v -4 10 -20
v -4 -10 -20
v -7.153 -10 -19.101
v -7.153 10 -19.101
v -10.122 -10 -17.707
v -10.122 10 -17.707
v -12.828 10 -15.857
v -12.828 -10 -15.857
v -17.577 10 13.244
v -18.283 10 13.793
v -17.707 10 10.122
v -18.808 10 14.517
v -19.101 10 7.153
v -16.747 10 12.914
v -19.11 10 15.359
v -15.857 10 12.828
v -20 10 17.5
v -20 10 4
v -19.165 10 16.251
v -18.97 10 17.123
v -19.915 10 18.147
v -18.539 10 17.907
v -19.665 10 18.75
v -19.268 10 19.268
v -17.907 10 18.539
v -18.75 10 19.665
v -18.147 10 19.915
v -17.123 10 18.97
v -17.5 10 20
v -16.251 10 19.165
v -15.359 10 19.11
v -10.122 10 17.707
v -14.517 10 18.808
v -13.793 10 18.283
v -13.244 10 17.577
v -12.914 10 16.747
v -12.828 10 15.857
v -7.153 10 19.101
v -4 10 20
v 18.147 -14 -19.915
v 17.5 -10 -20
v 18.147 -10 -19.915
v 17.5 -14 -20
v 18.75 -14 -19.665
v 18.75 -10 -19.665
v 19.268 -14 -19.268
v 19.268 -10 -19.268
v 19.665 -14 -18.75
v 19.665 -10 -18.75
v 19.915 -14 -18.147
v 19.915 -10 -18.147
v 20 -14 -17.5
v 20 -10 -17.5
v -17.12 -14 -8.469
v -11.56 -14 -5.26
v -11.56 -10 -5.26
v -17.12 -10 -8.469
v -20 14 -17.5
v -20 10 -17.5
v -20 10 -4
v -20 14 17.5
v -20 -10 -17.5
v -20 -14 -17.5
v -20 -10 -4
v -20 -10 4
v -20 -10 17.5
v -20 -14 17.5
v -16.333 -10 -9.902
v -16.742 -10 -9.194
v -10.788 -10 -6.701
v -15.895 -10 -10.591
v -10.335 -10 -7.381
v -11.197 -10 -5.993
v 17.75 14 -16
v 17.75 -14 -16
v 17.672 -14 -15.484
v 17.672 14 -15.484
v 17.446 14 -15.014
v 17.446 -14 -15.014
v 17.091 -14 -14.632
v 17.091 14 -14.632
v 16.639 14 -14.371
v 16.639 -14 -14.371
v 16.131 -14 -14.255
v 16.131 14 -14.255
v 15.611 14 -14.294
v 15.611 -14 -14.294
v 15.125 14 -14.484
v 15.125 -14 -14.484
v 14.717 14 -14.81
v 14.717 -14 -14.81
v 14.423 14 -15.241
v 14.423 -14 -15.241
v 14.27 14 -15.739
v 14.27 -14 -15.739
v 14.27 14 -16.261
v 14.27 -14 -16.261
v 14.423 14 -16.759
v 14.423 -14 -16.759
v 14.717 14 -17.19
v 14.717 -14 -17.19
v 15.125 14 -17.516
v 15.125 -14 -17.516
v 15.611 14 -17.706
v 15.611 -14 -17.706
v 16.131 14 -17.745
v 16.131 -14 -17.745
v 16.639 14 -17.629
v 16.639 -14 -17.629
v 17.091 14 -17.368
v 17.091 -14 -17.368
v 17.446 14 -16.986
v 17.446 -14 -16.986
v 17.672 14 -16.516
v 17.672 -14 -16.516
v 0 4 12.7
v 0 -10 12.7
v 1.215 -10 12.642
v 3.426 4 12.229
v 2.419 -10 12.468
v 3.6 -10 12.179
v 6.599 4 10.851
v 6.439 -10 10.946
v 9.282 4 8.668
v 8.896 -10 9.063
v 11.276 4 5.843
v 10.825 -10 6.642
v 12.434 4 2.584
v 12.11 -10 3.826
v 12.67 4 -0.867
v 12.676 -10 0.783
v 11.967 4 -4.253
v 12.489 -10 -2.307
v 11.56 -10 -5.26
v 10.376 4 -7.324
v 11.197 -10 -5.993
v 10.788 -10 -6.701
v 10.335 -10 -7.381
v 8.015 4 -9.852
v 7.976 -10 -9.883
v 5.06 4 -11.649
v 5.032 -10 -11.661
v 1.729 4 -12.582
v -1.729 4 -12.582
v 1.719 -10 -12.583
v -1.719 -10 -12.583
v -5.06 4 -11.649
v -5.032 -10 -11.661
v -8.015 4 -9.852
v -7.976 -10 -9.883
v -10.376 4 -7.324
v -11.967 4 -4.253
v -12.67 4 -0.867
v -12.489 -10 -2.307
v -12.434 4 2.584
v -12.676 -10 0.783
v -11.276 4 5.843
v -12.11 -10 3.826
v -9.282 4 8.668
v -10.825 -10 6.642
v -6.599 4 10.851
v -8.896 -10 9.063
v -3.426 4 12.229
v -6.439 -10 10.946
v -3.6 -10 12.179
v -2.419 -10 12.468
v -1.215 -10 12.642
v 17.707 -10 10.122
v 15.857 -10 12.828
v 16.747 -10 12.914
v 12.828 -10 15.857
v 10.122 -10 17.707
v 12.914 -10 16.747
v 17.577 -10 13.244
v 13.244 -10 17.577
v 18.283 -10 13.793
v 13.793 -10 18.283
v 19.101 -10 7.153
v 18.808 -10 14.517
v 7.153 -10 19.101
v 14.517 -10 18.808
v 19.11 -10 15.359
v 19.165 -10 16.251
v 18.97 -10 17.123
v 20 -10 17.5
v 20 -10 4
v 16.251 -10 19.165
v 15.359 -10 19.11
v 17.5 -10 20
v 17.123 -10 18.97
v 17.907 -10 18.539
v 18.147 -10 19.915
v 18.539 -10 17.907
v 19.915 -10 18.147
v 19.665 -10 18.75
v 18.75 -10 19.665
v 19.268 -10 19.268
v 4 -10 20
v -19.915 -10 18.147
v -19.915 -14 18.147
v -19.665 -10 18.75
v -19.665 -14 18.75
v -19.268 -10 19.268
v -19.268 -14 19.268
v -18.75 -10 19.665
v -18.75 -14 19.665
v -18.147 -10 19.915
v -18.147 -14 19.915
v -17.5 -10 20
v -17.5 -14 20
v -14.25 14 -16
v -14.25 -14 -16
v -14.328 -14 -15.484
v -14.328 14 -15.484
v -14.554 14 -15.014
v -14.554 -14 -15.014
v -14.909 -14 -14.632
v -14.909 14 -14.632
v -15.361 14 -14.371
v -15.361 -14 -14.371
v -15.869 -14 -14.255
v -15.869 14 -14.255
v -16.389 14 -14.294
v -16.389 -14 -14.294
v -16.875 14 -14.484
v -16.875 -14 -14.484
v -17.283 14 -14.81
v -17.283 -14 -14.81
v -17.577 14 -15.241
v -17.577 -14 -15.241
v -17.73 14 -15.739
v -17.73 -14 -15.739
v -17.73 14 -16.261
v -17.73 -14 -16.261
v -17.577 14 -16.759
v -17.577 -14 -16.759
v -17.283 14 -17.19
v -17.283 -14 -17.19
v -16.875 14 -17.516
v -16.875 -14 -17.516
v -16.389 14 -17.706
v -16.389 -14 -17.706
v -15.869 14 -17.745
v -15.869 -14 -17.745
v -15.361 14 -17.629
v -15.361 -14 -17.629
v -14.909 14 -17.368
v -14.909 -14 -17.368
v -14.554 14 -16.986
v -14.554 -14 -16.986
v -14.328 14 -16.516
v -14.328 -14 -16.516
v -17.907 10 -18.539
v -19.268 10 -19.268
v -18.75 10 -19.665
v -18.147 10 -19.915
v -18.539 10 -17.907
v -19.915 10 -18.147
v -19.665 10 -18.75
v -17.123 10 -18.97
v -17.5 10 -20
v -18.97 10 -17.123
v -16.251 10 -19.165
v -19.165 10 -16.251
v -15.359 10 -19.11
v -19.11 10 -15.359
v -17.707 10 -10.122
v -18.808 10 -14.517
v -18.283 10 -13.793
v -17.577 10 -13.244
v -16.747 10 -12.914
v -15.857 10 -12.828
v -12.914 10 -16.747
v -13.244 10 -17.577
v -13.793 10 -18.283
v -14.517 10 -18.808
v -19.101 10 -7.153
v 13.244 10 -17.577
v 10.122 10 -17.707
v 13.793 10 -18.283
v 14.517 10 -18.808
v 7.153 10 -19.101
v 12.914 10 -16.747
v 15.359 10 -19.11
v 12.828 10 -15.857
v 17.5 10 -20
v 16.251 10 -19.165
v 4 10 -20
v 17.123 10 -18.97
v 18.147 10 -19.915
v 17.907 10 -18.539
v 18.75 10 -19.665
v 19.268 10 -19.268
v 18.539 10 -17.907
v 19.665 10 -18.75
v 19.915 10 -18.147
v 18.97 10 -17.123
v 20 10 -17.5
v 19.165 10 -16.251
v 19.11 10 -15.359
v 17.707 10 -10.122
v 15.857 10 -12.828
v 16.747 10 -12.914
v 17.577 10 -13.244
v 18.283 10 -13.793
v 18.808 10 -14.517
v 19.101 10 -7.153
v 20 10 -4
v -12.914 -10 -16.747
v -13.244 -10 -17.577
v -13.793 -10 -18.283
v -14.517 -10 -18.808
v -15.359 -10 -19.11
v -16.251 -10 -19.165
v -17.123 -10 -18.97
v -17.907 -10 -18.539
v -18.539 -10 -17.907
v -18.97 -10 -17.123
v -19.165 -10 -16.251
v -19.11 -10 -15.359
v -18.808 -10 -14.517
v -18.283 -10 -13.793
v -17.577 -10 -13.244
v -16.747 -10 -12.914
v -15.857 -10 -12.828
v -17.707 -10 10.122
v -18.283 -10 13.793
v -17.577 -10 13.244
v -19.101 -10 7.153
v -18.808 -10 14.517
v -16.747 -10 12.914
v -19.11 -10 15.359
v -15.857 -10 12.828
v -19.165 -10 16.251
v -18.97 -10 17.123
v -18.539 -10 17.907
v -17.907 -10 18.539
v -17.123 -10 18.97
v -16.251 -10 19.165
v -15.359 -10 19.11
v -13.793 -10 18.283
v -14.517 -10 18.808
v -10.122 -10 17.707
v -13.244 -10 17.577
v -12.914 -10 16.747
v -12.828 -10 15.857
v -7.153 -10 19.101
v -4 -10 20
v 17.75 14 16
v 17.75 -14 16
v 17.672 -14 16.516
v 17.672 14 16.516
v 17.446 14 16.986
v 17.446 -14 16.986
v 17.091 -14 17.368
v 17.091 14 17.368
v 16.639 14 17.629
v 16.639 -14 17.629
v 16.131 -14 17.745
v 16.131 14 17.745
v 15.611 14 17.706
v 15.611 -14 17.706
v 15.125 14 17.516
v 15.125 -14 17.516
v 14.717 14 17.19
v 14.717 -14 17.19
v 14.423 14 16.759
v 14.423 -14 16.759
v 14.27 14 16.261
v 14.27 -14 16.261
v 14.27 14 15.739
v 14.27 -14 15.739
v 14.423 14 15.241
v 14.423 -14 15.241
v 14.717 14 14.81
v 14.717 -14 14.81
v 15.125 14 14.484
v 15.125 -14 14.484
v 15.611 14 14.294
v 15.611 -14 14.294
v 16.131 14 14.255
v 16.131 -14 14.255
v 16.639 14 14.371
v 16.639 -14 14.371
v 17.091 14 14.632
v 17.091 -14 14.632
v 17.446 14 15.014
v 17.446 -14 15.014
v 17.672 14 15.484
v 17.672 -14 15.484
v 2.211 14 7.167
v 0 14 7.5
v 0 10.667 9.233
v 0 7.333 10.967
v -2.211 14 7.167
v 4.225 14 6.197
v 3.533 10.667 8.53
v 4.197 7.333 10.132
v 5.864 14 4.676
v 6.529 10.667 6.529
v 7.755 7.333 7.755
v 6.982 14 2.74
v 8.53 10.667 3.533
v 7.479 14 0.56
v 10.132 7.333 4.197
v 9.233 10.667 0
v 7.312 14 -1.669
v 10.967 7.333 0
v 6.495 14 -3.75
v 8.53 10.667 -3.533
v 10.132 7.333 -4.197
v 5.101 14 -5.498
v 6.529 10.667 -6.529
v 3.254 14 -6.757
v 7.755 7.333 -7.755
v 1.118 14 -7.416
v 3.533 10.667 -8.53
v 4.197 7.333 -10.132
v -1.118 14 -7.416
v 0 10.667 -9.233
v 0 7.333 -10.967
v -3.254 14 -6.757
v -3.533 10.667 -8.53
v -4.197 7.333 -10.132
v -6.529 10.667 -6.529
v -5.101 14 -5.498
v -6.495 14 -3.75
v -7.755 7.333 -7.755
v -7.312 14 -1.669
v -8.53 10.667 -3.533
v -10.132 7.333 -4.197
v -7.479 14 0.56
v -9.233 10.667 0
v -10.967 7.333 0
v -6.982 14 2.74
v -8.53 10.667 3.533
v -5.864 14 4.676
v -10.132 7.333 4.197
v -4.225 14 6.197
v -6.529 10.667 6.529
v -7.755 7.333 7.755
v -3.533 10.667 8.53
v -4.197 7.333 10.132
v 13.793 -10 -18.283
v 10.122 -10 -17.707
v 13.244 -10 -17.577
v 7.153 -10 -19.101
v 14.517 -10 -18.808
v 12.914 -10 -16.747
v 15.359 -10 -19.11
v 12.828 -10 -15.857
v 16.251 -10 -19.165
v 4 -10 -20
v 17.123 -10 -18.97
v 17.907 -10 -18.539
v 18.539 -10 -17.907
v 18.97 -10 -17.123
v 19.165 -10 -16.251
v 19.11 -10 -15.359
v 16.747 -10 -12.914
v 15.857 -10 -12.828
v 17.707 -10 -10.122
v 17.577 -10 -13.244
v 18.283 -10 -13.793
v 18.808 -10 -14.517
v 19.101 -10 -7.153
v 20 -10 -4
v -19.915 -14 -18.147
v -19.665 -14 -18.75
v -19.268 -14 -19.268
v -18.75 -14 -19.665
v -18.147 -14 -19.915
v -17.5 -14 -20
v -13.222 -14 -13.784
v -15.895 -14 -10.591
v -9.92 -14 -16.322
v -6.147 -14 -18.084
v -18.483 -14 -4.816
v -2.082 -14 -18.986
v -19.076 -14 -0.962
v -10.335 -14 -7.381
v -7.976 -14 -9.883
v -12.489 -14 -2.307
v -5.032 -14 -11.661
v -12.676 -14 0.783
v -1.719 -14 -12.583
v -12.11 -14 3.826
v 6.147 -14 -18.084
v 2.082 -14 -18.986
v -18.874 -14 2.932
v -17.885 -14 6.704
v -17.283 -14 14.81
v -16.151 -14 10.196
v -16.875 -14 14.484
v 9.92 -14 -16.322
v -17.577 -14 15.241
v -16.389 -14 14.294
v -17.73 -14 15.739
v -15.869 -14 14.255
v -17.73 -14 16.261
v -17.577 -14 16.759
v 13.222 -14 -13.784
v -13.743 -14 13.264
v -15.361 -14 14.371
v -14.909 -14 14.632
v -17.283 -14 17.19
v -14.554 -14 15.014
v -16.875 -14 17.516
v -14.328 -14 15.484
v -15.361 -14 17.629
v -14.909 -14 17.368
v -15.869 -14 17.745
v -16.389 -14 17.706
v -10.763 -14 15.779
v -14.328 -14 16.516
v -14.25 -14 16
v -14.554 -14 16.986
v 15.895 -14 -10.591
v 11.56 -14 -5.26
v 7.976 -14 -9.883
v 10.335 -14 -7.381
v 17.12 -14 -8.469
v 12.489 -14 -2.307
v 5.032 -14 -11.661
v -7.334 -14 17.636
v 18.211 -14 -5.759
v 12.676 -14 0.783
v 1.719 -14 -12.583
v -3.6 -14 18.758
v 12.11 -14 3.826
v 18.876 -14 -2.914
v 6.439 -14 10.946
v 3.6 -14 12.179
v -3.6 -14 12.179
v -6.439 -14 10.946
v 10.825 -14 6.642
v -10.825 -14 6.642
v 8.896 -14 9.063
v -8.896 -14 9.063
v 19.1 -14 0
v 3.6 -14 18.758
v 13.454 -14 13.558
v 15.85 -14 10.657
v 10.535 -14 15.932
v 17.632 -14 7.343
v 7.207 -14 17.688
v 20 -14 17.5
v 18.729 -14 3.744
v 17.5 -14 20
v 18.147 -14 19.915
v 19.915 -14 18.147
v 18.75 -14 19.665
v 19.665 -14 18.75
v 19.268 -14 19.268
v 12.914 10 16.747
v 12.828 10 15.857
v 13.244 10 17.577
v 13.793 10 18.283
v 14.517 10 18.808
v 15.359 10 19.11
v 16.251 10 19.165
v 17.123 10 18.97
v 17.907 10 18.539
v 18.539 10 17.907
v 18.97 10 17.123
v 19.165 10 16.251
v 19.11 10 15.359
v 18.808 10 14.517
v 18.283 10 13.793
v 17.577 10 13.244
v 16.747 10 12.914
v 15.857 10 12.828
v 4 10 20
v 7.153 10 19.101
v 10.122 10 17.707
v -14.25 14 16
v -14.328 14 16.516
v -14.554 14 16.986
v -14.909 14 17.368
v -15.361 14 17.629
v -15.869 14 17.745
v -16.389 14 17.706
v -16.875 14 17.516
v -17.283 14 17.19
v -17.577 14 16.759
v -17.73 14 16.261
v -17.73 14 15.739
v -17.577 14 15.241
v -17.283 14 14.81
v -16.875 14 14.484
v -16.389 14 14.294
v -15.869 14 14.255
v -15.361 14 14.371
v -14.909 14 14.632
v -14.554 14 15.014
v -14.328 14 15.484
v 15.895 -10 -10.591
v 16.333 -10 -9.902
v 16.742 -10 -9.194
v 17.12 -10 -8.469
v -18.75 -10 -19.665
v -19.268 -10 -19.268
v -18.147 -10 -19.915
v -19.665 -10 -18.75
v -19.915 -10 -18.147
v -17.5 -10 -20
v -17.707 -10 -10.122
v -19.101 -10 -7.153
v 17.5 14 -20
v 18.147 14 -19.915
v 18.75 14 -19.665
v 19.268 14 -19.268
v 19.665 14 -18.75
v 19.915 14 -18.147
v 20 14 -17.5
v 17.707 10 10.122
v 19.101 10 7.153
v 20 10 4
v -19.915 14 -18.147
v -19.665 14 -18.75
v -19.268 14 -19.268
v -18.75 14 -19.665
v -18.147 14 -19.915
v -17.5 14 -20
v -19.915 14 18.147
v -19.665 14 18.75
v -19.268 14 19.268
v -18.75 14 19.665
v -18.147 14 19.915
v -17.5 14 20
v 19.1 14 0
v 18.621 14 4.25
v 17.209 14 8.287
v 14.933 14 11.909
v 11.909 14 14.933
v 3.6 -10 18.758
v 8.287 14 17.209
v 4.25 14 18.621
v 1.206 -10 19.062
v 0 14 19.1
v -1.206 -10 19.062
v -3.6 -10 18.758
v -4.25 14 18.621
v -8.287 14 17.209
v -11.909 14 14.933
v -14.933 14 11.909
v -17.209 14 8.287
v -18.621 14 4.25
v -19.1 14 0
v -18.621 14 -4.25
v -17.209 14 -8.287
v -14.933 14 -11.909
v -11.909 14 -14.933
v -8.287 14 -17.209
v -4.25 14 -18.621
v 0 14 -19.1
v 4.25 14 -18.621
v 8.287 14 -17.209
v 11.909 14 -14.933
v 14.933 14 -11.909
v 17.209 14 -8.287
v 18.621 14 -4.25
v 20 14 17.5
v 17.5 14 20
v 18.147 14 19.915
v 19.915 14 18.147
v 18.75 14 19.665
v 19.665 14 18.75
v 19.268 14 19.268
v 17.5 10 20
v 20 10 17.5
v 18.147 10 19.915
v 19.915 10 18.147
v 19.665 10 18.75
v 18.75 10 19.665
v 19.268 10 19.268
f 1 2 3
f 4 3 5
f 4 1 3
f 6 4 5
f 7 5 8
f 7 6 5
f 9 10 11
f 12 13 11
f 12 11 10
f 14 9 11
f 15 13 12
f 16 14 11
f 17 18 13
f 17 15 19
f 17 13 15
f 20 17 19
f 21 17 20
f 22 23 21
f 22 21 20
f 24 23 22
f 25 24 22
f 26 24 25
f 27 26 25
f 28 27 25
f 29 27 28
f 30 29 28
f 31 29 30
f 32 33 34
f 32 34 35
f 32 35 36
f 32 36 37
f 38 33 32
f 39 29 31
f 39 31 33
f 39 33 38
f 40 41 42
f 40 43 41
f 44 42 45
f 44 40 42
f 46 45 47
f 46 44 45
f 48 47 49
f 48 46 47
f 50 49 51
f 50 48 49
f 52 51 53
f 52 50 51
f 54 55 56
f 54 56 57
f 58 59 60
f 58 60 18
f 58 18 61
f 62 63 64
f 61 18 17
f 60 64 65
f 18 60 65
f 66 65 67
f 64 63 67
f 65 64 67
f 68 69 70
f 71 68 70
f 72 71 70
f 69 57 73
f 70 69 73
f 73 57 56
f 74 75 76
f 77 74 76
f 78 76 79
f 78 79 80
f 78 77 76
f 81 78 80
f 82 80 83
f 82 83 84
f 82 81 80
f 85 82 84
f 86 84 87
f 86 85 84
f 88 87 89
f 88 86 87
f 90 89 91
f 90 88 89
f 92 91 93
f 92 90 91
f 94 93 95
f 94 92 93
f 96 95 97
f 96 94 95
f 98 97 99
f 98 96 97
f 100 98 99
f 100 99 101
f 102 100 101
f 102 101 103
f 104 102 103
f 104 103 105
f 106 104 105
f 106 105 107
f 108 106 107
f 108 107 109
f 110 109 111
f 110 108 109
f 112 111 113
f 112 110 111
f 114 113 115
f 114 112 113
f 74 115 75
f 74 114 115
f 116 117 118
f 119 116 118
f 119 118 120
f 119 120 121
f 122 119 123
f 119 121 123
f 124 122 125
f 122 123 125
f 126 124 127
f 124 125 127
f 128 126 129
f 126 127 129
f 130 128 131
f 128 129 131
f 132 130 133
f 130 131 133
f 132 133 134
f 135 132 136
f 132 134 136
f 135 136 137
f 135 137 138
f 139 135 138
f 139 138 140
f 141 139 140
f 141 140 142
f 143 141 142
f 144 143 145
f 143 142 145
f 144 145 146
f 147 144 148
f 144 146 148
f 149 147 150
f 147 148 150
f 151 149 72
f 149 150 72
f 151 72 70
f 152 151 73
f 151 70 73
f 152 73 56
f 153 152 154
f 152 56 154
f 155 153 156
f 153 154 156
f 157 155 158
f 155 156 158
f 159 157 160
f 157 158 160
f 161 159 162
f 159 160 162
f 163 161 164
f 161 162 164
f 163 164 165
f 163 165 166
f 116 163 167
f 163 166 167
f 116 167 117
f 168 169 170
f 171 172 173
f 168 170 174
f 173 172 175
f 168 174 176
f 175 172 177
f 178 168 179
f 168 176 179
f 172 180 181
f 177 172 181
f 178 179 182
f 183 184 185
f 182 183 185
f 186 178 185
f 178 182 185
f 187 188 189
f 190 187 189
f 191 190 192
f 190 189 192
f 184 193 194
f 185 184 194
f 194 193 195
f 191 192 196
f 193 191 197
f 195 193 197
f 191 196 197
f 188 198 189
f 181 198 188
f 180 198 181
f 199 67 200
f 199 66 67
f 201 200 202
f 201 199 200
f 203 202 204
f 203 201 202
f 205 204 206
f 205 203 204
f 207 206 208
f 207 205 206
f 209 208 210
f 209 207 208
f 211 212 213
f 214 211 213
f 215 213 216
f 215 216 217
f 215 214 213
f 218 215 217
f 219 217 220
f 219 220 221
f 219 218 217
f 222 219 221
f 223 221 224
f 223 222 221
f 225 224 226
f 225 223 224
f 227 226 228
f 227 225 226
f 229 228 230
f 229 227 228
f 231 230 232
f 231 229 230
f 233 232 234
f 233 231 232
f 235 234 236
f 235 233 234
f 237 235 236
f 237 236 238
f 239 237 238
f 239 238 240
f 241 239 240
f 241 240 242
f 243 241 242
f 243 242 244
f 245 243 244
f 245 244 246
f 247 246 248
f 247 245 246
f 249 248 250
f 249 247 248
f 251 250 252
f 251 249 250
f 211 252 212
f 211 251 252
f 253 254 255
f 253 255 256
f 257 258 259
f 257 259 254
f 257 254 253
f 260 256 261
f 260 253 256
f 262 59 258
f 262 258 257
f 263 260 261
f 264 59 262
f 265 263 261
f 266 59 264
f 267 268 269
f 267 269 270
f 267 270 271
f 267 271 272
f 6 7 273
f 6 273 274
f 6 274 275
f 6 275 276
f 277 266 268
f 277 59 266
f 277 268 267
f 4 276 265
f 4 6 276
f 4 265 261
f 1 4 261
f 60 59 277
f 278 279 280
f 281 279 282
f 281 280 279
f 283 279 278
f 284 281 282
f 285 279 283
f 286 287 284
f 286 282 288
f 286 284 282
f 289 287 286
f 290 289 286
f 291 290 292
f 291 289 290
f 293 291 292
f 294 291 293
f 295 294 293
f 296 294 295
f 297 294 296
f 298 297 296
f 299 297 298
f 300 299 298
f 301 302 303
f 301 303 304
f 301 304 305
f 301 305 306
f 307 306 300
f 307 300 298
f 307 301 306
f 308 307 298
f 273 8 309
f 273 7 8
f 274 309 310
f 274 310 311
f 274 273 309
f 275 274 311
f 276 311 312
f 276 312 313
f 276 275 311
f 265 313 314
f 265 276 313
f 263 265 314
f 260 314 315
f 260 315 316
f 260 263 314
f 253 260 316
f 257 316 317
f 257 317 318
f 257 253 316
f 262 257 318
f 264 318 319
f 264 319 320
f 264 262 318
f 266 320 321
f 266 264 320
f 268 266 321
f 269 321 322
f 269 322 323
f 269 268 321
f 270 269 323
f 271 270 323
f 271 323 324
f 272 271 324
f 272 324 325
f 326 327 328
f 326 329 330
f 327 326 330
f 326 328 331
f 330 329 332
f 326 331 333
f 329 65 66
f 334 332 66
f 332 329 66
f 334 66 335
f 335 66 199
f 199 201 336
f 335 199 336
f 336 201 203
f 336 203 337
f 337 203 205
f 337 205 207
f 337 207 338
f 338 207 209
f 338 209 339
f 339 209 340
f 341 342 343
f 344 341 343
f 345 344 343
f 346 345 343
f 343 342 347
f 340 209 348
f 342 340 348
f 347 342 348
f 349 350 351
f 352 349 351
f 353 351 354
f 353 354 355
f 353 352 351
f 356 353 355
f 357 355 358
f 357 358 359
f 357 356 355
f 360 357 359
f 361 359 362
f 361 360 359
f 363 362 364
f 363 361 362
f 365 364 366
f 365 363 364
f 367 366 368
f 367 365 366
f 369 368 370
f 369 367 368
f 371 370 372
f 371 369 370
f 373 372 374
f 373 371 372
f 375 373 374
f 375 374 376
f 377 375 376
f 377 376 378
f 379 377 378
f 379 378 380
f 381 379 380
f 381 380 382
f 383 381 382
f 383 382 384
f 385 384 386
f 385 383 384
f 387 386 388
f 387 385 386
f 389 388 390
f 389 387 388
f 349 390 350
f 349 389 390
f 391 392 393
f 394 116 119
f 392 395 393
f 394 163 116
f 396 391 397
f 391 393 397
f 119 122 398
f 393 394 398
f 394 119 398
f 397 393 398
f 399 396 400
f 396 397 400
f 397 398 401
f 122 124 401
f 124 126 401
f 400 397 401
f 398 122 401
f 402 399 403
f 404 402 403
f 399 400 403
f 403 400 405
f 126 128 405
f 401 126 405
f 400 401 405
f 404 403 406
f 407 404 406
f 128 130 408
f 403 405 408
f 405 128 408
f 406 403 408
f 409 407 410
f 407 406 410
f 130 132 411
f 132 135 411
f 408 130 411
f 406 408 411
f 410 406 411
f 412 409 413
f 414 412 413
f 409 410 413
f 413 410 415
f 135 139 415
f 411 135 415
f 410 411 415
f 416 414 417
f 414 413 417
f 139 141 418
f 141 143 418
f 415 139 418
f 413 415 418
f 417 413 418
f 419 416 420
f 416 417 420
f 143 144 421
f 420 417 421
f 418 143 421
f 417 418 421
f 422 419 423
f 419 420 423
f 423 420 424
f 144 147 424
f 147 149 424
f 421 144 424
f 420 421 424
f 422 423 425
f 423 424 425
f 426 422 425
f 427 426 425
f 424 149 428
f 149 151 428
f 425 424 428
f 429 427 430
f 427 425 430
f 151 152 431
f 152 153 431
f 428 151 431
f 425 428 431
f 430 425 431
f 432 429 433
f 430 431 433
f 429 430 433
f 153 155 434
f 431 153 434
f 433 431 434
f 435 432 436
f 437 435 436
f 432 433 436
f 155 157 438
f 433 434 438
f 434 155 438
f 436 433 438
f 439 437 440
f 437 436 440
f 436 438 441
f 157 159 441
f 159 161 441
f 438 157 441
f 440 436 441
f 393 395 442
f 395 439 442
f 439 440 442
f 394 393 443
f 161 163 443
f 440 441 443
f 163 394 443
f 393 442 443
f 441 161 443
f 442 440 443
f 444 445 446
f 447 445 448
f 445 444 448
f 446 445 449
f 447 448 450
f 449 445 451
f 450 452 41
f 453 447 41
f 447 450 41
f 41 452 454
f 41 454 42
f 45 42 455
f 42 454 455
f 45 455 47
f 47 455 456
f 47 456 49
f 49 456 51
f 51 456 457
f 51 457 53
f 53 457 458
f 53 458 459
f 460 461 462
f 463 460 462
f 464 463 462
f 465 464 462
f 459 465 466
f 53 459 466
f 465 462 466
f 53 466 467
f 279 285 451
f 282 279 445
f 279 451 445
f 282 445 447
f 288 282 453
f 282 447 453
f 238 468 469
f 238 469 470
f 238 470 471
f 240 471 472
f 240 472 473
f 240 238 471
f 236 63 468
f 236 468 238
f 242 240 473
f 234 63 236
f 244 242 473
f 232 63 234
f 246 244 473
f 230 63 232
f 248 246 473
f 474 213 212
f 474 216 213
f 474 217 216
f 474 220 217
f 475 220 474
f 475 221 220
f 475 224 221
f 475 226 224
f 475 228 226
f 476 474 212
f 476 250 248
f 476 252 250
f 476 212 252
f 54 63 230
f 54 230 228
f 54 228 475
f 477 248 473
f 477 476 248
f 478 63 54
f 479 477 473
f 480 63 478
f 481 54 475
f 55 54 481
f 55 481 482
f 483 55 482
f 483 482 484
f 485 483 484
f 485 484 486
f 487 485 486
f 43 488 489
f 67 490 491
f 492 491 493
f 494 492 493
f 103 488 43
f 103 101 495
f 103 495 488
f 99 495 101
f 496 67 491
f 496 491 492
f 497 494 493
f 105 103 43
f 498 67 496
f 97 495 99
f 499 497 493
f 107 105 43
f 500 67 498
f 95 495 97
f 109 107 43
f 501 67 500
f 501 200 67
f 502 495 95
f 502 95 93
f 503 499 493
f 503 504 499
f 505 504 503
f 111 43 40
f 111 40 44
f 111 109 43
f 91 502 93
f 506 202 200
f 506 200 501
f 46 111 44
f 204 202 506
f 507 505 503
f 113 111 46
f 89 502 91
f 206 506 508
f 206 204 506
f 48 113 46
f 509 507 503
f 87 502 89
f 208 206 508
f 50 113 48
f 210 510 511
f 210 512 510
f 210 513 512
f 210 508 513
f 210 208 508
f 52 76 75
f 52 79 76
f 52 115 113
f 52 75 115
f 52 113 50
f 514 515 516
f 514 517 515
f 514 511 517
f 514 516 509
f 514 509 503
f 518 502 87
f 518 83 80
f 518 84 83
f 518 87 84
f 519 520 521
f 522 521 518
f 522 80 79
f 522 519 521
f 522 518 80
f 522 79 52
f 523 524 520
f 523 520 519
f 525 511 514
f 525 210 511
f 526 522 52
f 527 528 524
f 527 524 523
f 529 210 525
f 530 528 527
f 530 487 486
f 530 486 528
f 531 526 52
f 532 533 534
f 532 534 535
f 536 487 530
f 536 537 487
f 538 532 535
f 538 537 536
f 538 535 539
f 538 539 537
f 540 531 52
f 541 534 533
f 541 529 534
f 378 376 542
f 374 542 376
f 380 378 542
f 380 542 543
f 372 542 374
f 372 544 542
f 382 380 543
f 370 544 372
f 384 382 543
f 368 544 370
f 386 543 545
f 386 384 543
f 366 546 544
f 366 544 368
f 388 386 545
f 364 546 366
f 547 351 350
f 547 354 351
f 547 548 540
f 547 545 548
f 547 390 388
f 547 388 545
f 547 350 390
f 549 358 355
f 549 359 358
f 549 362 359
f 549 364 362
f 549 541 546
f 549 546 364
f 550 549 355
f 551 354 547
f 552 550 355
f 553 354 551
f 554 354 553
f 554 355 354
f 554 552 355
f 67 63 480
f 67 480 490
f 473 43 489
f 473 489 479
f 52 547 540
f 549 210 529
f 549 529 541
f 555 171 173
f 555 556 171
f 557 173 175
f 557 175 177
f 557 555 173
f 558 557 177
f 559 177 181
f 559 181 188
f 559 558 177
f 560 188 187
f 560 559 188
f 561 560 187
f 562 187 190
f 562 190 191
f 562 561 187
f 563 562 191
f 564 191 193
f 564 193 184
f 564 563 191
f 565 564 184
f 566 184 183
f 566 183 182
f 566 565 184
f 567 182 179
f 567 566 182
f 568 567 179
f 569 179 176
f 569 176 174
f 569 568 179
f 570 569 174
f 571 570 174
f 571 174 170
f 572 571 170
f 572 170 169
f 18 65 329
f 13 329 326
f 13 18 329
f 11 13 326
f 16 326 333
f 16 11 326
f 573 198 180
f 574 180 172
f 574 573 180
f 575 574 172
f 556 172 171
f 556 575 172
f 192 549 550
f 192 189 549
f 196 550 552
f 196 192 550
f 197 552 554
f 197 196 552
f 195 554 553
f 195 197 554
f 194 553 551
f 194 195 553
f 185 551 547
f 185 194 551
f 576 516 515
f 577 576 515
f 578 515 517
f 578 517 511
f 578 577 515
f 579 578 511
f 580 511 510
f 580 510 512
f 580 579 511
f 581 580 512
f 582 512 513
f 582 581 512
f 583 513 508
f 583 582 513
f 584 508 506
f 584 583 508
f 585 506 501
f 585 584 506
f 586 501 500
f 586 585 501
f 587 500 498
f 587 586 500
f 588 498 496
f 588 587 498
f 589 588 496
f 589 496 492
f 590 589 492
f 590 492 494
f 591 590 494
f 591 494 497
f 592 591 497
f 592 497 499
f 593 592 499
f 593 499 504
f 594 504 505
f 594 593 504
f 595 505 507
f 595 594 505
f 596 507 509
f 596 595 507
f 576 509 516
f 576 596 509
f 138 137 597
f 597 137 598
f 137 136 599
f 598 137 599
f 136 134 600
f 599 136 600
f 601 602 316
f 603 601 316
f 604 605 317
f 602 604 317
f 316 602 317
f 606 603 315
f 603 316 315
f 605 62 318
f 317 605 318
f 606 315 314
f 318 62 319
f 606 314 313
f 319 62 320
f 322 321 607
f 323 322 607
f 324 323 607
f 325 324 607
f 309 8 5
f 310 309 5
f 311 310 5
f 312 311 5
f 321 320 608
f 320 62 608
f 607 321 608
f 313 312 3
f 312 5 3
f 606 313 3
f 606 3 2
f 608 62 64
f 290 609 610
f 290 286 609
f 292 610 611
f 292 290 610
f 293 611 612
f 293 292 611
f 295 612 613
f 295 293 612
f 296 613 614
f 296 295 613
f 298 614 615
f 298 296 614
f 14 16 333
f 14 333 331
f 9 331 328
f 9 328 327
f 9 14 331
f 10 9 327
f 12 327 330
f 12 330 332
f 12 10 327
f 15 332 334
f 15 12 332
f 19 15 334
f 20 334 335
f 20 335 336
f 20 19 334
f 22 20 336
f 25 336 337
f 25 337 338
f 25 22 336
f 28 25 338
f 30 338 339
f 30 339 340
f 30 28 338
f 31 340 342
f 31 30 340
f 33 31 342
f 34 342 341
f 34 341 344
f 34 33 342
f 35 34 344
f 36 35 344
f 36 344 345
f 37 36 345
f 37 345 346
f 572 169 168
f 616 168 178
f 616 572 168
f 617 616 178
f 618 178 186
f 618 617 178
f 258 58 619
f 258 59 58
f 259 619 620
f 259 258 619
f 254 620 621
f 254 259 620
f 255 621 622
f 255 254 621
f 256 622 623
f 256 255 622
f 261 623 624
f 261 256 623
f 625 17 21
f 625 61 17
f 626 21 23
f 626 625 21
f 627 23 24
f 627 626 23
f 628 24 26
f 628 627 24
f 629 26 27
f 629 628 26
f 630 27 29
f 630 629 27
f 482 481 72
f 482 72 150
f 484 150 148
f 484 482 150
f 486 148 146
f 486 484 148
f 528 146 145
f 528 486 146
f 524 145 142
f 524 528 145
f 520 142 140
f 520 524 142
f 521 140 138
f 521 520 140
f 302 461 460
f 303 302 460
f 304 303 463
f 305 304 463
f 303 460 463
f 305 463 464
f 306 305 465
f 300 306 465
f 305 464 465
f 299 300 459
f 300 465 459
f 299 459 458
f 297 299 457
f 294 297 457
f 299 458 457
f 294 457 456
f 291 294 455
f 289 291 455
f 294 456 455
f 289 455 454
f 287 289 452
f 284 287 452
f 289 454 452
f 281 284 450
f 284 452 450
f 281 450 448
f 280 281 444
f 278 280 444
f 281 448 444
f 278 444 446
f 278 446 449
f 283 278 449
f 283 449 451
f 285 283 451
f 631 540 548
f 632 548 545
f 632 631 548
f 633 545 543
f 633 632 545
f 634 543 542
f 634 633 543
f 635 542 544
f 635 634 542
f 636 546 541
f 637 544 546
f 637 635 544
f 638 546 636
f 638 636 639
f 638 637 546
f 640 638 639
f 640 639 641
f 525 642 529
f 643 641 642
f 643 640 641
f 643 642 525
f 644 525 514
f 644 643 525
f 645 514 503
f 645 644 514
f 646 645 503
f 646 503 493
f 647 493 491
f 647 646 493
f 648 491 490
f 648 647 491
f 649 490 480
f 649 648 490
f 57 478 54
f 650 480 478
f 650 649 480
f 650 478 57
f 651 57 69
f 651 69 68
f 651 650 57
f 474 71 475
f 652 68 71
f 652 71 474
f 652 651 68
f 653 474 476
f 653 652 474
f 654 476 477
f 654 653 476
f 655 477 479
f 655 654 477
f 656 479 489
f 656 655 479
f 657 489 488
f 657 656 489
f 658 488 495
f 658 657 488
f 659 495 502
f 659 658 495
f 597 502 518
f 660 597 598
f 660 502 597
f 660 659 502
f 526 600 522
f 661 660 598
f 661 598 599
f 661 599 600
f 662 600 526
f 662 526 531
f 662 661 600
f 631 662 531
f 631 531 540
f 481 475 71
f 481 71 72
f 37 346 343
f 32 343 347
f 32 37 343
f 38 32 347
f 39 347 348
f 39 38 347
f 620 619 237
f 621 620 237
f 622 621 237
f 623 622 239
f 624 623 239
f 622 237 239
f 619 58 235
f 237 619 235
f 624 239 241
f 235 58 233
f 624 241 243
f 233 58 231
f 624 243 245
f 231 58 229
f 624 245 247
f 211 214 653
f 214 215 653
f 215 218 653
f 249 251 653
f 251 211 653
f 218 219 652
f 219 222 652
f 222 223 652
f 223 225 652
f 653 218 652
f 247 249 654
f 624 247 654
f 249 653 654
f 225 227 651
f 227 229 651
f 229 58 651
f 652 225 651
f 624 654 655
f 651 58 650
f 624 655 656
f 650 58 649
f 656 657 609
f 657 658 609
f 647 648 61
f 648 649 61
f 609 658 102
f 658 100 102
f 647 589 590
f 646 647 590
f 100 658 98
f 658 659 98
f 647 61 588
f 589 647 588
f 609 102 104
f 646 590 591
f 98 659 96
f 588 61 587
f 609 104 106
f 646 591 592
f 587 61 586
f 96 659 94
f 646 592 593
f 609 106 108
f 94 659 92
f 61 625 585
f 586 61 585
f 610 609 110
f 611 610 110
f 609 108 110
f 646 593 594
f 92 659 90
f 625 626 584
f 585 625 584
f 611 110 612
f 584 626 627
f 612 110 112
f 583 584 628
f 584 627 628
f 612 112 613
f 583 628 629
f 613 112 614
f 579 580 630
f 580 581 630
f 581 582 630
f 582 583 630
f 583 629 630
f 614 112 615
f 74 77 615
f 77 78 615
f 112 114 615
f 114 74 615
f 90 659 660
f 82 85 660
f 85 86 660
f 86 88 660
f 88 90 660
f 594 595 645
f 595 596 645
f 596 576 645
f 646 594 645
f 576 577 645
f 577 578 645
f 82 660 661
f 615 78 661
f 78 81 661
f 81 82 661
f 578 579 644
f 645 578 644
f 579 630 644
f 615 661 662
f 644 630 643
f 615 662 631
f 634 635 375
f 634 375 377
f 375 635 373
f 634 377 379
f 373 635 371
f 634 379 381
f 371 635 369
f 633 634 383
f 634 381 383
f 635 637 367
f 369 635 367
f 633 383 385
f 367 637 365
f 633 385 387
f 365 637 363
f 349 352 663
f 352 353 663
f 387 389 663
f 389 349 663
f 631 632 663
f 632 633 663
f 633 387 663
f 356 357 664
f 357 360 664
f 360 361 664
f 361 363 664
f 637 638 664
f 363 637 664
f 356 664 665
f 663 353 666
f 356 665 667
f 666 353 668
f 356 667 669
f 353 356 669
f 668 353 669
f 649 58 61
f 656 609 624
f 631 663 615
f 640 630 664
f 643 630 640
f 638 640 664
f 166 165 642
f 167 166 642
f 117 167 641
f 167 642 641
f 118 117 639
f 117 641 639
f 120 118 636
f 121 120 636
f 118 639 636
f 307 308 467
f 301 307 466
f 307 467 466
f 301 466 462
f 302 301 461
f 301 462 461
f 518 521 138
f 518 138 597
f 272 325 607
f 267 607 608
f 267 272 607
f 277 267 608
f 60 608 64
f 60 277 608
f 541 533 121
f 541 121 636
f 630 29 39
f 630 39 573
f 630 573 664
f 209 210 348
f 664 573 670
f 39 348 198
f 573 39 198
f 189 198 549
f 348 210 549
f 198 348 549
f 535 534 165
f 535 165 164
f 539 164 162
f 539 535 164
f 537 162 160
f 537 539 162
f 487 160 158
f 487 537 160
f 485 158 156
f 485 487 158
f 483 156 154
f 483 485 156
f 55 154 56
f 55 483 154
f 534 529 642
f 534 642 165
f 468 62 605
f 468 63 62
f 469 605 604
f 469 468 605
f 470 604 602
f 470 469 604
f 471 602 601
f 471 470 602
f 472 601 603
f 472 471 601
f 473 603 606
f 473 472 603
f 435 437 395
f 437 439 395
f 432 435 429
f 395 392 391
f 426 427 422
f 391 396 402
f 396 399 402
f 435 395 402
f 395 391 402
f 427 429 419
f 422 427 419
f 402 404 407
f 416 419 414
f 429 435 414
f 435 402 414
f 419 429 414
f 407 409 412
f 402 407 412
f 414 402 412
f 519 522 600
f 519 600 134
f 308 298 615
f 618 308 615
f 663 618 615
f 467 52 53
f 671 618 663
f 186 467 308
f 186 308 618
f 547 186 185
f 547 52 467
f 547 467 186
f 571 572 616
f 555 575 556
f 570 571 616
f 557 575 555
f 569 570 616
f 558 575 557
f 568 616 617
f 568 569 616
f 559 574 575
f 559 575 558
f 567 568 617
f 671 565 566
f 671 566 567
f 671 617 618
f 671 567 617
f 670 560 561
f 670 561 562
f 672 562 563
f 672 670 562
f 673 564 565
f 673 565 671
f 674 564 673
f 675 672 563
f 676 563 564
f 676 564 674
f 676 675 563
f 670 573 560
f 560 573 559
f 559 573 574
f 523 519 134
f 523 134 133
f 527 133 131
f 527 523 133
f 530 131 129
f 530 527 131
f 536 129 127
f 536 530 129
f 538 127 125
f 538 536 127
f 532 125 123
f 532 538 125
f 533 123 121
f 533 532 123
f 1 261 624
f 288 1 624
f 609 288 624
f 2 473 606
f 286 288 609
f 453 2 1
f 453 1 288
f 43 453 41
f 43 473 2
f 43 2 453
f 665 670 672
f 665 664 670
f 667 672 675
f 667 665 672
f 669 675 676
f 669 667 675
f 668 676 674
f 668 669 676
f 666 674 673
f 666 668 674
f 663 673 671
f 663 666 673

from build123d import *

# Parameters (mm, degrees)
F0_W     = 40
F0_H     = 40
F0_R     = 1.75
F0_R_2   = 19.1
F1_DEPTH = 14
F3_DEPTH = 10
F4_R     = 2.5
F6_DEPTH = 4


with BuildPart() as f1:
    # F0 (on Front) → F1 (new body, symmetric)
    with BuildSketch(Plane.XZ):
        Rectangle(F0_W, F0_H)
        with Locations((-16, -16)):
            Circle(F0_R, mode=Mode.SUBTRACT)
        with Locations((16, -16)):
            Circle(F0_R, mode=Mode.SUBTRACT)
        with Locations((-16, 16)):
            Circle(F0_R, mode=Mode.SUBTRACT)
        Circle(F0_R_2, mode=Mode.SUBTRACT)
        with Locations((16, 16)):
            Circle(F0_R, mode=Mode.SUBTRACT)
    extrude(amount=F1_DEPTH, both=True)

    # F2 (on Front) → F3 (cut, symmetric)
    with BuildSketch(Plane.XZ):
        with BuildLine():
            ThreePointArc((-15.8567471072, 12.8282333616), (-18.2450640303, 18.2450640303), (-12.8282333616, 15.8567471072))
            ThreePointArc((-12.8282333616, 15.8567471072), (-8.6653906808, 18.463775463), (-4, 20))
            Line((-4, 20), (-4, 20.3960780544))
            Line((-4, 20.3960780544), (-20.3960780544, 20.3960780544))
            Line((-20.3960780544, 20.3960780544), (-20.3960780544, 4))
            Line((-20.3960780544, 4), (-20, 4))
            ThreePointArc((-20, 4), (-18.463775463, 8.6653906808), (-15.8567471072, 12.8282333616))
        make_face()
        with BuildLine():
            Line((20.3960780544, 4), (20.3960780544, 20.3960780544))
            Line((20.3960780544, 20.3960780544), (4, 20.3960780544))
            Line((4, 20.3960780544), (4, 20))
            ThreePointArc((4, 20), (8.6653906808, 18.463775463), (12.8282333616, 15.8567471072))
            ThreePointArc((12.8282333616, 15.8567471072), (18.2450640303, 18.2450640303), (15.8567471072, 12.8282333616))
            ThreePointArc((15.8567471072, 12.8282333616), (18.463775463, 8.6653906808), (20, 4))
            Line((20, 4), (20.3960780544, 4))
        make_face()
        with BuildLine():
            Line((-20.3960780544, -4), (-20.3960780544, -20.3960780544))
            Line((-20.3960780544, -20.3960780544), (-4, -20.3960780544))
            Line((-4, -20.3960780544), (-4, -20))
            ThreePointArc((-4, -20), (-8.6653906808, -18.463775463), (-12.8282333616, -15.8567471072))
            ThreePointArc((-12.8282333616, -15.8567471072), (-18.2450640303, -18.2450640303), (-15.8567471072, -12.8282333616))
            ThreePointArc((-15.8567471072, -12.8282333616), (-18.463775463, -8.6653906808), (-20, -4))
            Line((-20, -4), (-20.3960780544, -4))
        make_face()
        with BuildLine():
            Line((4, -20.3960780544), (20.3960780544, -20.3960780544))
            Line((20.3960780544, -20.3960780544), (20.3960780544, -4))
            Line((20.3960780544, -4), (20, -4))
            ThreePointArc((20, -4), (18.463775463, -8.6653906808), (15.8567471072, -12.8282333616))
            ThreePointArc((15.8567471072, -12.8282333616), (18.2450640303, -18.2450640303), (12.8282333616, -15.8567471072))
            ThreePointArc((12.8282333616, -15.8567471072), (8.6653906808, -18.463775463), (4, -20))
            Line((4, -20), (4, -20.3960780544))
        make_face()
    extrude(amount=F3_DEPTH, both=True, mode=Mode.SUBTRACT)

    # F4
    f4_edges = [f1.edges().sort_by_distance(p)[0] for p in [
        (20, -12, 20),
        (20, 12, 20),
        (20, -12, -20),
        (20, 12, -20),
        (-20, -12, 20),
        (-20, 12, 20),
        (-20, 12, -20),
        (-20, -12, -20),
    ]]
    fillet(f4_edges, radius=F4_R)

    # F5 (on face) → F6 (join)
    with BuildSketch(Plane.XZ.offset(14)):
        with BuildLine():
            Line((-3.6, 18.7576650999), (-3.6, 12.1790804251))
            ThreePointArc((-3.6, 12.1790804251), (-11.5533772944, 5.2734687913), (-11.5597385217, -5.2595099877))
            Line((-11.5597385217, -5.2595099877), (-17.1195297525, -8.4694569515))
            ThreePointArc((-17.1195297525, -8.4694569515), (-16.5410852123, -9.55), (-15.8945297525, -10.5912191908))
            Line((-15.8945297525, -10.5912191908), (-10.3347385217, -7.381272227))
            ThreePointArc((-10.3347385217, -7.381272227), (0, -12.7), (10.3347385217, -7.381272227))
            Line((10.3347385217, -7.381272227), (15.8945297525, -10.5912191908))
            ThreePointArc((15.8945297525, -10.5912191908), (16.5410852123, -9.55), (17.1195297525, -8.4694569515))
            Line((17.1195297525, -8.4694569515), (11.5597385217, -5.2595099877))
            ThreePointArc((11.5597385217, -5.2595099877), (11.5533772944, 5.2734687913), (3.6, 12.1790804251))
            Line((3.6, 12.1790804251), (3.6, 18.7576650999))
            ThreePointArc((3.6, 18.7576650999), (0, 19.1), (-3.6, 18.7576650999))
        make_face()
    extrude(amount=-F6_DEPTH)

    # F7 (on Right) → F8 (revolve)
    with BuildSketch(Plane.YZ):
        Polygon((-10, 0), (14, 0), (14, 7.5), (4, 12.7), (-10, 12.7), align=None)
    revolve(axis=Axis((0, 1.2222109362, 0), (0, 1, 0)))


solid = f1.part
